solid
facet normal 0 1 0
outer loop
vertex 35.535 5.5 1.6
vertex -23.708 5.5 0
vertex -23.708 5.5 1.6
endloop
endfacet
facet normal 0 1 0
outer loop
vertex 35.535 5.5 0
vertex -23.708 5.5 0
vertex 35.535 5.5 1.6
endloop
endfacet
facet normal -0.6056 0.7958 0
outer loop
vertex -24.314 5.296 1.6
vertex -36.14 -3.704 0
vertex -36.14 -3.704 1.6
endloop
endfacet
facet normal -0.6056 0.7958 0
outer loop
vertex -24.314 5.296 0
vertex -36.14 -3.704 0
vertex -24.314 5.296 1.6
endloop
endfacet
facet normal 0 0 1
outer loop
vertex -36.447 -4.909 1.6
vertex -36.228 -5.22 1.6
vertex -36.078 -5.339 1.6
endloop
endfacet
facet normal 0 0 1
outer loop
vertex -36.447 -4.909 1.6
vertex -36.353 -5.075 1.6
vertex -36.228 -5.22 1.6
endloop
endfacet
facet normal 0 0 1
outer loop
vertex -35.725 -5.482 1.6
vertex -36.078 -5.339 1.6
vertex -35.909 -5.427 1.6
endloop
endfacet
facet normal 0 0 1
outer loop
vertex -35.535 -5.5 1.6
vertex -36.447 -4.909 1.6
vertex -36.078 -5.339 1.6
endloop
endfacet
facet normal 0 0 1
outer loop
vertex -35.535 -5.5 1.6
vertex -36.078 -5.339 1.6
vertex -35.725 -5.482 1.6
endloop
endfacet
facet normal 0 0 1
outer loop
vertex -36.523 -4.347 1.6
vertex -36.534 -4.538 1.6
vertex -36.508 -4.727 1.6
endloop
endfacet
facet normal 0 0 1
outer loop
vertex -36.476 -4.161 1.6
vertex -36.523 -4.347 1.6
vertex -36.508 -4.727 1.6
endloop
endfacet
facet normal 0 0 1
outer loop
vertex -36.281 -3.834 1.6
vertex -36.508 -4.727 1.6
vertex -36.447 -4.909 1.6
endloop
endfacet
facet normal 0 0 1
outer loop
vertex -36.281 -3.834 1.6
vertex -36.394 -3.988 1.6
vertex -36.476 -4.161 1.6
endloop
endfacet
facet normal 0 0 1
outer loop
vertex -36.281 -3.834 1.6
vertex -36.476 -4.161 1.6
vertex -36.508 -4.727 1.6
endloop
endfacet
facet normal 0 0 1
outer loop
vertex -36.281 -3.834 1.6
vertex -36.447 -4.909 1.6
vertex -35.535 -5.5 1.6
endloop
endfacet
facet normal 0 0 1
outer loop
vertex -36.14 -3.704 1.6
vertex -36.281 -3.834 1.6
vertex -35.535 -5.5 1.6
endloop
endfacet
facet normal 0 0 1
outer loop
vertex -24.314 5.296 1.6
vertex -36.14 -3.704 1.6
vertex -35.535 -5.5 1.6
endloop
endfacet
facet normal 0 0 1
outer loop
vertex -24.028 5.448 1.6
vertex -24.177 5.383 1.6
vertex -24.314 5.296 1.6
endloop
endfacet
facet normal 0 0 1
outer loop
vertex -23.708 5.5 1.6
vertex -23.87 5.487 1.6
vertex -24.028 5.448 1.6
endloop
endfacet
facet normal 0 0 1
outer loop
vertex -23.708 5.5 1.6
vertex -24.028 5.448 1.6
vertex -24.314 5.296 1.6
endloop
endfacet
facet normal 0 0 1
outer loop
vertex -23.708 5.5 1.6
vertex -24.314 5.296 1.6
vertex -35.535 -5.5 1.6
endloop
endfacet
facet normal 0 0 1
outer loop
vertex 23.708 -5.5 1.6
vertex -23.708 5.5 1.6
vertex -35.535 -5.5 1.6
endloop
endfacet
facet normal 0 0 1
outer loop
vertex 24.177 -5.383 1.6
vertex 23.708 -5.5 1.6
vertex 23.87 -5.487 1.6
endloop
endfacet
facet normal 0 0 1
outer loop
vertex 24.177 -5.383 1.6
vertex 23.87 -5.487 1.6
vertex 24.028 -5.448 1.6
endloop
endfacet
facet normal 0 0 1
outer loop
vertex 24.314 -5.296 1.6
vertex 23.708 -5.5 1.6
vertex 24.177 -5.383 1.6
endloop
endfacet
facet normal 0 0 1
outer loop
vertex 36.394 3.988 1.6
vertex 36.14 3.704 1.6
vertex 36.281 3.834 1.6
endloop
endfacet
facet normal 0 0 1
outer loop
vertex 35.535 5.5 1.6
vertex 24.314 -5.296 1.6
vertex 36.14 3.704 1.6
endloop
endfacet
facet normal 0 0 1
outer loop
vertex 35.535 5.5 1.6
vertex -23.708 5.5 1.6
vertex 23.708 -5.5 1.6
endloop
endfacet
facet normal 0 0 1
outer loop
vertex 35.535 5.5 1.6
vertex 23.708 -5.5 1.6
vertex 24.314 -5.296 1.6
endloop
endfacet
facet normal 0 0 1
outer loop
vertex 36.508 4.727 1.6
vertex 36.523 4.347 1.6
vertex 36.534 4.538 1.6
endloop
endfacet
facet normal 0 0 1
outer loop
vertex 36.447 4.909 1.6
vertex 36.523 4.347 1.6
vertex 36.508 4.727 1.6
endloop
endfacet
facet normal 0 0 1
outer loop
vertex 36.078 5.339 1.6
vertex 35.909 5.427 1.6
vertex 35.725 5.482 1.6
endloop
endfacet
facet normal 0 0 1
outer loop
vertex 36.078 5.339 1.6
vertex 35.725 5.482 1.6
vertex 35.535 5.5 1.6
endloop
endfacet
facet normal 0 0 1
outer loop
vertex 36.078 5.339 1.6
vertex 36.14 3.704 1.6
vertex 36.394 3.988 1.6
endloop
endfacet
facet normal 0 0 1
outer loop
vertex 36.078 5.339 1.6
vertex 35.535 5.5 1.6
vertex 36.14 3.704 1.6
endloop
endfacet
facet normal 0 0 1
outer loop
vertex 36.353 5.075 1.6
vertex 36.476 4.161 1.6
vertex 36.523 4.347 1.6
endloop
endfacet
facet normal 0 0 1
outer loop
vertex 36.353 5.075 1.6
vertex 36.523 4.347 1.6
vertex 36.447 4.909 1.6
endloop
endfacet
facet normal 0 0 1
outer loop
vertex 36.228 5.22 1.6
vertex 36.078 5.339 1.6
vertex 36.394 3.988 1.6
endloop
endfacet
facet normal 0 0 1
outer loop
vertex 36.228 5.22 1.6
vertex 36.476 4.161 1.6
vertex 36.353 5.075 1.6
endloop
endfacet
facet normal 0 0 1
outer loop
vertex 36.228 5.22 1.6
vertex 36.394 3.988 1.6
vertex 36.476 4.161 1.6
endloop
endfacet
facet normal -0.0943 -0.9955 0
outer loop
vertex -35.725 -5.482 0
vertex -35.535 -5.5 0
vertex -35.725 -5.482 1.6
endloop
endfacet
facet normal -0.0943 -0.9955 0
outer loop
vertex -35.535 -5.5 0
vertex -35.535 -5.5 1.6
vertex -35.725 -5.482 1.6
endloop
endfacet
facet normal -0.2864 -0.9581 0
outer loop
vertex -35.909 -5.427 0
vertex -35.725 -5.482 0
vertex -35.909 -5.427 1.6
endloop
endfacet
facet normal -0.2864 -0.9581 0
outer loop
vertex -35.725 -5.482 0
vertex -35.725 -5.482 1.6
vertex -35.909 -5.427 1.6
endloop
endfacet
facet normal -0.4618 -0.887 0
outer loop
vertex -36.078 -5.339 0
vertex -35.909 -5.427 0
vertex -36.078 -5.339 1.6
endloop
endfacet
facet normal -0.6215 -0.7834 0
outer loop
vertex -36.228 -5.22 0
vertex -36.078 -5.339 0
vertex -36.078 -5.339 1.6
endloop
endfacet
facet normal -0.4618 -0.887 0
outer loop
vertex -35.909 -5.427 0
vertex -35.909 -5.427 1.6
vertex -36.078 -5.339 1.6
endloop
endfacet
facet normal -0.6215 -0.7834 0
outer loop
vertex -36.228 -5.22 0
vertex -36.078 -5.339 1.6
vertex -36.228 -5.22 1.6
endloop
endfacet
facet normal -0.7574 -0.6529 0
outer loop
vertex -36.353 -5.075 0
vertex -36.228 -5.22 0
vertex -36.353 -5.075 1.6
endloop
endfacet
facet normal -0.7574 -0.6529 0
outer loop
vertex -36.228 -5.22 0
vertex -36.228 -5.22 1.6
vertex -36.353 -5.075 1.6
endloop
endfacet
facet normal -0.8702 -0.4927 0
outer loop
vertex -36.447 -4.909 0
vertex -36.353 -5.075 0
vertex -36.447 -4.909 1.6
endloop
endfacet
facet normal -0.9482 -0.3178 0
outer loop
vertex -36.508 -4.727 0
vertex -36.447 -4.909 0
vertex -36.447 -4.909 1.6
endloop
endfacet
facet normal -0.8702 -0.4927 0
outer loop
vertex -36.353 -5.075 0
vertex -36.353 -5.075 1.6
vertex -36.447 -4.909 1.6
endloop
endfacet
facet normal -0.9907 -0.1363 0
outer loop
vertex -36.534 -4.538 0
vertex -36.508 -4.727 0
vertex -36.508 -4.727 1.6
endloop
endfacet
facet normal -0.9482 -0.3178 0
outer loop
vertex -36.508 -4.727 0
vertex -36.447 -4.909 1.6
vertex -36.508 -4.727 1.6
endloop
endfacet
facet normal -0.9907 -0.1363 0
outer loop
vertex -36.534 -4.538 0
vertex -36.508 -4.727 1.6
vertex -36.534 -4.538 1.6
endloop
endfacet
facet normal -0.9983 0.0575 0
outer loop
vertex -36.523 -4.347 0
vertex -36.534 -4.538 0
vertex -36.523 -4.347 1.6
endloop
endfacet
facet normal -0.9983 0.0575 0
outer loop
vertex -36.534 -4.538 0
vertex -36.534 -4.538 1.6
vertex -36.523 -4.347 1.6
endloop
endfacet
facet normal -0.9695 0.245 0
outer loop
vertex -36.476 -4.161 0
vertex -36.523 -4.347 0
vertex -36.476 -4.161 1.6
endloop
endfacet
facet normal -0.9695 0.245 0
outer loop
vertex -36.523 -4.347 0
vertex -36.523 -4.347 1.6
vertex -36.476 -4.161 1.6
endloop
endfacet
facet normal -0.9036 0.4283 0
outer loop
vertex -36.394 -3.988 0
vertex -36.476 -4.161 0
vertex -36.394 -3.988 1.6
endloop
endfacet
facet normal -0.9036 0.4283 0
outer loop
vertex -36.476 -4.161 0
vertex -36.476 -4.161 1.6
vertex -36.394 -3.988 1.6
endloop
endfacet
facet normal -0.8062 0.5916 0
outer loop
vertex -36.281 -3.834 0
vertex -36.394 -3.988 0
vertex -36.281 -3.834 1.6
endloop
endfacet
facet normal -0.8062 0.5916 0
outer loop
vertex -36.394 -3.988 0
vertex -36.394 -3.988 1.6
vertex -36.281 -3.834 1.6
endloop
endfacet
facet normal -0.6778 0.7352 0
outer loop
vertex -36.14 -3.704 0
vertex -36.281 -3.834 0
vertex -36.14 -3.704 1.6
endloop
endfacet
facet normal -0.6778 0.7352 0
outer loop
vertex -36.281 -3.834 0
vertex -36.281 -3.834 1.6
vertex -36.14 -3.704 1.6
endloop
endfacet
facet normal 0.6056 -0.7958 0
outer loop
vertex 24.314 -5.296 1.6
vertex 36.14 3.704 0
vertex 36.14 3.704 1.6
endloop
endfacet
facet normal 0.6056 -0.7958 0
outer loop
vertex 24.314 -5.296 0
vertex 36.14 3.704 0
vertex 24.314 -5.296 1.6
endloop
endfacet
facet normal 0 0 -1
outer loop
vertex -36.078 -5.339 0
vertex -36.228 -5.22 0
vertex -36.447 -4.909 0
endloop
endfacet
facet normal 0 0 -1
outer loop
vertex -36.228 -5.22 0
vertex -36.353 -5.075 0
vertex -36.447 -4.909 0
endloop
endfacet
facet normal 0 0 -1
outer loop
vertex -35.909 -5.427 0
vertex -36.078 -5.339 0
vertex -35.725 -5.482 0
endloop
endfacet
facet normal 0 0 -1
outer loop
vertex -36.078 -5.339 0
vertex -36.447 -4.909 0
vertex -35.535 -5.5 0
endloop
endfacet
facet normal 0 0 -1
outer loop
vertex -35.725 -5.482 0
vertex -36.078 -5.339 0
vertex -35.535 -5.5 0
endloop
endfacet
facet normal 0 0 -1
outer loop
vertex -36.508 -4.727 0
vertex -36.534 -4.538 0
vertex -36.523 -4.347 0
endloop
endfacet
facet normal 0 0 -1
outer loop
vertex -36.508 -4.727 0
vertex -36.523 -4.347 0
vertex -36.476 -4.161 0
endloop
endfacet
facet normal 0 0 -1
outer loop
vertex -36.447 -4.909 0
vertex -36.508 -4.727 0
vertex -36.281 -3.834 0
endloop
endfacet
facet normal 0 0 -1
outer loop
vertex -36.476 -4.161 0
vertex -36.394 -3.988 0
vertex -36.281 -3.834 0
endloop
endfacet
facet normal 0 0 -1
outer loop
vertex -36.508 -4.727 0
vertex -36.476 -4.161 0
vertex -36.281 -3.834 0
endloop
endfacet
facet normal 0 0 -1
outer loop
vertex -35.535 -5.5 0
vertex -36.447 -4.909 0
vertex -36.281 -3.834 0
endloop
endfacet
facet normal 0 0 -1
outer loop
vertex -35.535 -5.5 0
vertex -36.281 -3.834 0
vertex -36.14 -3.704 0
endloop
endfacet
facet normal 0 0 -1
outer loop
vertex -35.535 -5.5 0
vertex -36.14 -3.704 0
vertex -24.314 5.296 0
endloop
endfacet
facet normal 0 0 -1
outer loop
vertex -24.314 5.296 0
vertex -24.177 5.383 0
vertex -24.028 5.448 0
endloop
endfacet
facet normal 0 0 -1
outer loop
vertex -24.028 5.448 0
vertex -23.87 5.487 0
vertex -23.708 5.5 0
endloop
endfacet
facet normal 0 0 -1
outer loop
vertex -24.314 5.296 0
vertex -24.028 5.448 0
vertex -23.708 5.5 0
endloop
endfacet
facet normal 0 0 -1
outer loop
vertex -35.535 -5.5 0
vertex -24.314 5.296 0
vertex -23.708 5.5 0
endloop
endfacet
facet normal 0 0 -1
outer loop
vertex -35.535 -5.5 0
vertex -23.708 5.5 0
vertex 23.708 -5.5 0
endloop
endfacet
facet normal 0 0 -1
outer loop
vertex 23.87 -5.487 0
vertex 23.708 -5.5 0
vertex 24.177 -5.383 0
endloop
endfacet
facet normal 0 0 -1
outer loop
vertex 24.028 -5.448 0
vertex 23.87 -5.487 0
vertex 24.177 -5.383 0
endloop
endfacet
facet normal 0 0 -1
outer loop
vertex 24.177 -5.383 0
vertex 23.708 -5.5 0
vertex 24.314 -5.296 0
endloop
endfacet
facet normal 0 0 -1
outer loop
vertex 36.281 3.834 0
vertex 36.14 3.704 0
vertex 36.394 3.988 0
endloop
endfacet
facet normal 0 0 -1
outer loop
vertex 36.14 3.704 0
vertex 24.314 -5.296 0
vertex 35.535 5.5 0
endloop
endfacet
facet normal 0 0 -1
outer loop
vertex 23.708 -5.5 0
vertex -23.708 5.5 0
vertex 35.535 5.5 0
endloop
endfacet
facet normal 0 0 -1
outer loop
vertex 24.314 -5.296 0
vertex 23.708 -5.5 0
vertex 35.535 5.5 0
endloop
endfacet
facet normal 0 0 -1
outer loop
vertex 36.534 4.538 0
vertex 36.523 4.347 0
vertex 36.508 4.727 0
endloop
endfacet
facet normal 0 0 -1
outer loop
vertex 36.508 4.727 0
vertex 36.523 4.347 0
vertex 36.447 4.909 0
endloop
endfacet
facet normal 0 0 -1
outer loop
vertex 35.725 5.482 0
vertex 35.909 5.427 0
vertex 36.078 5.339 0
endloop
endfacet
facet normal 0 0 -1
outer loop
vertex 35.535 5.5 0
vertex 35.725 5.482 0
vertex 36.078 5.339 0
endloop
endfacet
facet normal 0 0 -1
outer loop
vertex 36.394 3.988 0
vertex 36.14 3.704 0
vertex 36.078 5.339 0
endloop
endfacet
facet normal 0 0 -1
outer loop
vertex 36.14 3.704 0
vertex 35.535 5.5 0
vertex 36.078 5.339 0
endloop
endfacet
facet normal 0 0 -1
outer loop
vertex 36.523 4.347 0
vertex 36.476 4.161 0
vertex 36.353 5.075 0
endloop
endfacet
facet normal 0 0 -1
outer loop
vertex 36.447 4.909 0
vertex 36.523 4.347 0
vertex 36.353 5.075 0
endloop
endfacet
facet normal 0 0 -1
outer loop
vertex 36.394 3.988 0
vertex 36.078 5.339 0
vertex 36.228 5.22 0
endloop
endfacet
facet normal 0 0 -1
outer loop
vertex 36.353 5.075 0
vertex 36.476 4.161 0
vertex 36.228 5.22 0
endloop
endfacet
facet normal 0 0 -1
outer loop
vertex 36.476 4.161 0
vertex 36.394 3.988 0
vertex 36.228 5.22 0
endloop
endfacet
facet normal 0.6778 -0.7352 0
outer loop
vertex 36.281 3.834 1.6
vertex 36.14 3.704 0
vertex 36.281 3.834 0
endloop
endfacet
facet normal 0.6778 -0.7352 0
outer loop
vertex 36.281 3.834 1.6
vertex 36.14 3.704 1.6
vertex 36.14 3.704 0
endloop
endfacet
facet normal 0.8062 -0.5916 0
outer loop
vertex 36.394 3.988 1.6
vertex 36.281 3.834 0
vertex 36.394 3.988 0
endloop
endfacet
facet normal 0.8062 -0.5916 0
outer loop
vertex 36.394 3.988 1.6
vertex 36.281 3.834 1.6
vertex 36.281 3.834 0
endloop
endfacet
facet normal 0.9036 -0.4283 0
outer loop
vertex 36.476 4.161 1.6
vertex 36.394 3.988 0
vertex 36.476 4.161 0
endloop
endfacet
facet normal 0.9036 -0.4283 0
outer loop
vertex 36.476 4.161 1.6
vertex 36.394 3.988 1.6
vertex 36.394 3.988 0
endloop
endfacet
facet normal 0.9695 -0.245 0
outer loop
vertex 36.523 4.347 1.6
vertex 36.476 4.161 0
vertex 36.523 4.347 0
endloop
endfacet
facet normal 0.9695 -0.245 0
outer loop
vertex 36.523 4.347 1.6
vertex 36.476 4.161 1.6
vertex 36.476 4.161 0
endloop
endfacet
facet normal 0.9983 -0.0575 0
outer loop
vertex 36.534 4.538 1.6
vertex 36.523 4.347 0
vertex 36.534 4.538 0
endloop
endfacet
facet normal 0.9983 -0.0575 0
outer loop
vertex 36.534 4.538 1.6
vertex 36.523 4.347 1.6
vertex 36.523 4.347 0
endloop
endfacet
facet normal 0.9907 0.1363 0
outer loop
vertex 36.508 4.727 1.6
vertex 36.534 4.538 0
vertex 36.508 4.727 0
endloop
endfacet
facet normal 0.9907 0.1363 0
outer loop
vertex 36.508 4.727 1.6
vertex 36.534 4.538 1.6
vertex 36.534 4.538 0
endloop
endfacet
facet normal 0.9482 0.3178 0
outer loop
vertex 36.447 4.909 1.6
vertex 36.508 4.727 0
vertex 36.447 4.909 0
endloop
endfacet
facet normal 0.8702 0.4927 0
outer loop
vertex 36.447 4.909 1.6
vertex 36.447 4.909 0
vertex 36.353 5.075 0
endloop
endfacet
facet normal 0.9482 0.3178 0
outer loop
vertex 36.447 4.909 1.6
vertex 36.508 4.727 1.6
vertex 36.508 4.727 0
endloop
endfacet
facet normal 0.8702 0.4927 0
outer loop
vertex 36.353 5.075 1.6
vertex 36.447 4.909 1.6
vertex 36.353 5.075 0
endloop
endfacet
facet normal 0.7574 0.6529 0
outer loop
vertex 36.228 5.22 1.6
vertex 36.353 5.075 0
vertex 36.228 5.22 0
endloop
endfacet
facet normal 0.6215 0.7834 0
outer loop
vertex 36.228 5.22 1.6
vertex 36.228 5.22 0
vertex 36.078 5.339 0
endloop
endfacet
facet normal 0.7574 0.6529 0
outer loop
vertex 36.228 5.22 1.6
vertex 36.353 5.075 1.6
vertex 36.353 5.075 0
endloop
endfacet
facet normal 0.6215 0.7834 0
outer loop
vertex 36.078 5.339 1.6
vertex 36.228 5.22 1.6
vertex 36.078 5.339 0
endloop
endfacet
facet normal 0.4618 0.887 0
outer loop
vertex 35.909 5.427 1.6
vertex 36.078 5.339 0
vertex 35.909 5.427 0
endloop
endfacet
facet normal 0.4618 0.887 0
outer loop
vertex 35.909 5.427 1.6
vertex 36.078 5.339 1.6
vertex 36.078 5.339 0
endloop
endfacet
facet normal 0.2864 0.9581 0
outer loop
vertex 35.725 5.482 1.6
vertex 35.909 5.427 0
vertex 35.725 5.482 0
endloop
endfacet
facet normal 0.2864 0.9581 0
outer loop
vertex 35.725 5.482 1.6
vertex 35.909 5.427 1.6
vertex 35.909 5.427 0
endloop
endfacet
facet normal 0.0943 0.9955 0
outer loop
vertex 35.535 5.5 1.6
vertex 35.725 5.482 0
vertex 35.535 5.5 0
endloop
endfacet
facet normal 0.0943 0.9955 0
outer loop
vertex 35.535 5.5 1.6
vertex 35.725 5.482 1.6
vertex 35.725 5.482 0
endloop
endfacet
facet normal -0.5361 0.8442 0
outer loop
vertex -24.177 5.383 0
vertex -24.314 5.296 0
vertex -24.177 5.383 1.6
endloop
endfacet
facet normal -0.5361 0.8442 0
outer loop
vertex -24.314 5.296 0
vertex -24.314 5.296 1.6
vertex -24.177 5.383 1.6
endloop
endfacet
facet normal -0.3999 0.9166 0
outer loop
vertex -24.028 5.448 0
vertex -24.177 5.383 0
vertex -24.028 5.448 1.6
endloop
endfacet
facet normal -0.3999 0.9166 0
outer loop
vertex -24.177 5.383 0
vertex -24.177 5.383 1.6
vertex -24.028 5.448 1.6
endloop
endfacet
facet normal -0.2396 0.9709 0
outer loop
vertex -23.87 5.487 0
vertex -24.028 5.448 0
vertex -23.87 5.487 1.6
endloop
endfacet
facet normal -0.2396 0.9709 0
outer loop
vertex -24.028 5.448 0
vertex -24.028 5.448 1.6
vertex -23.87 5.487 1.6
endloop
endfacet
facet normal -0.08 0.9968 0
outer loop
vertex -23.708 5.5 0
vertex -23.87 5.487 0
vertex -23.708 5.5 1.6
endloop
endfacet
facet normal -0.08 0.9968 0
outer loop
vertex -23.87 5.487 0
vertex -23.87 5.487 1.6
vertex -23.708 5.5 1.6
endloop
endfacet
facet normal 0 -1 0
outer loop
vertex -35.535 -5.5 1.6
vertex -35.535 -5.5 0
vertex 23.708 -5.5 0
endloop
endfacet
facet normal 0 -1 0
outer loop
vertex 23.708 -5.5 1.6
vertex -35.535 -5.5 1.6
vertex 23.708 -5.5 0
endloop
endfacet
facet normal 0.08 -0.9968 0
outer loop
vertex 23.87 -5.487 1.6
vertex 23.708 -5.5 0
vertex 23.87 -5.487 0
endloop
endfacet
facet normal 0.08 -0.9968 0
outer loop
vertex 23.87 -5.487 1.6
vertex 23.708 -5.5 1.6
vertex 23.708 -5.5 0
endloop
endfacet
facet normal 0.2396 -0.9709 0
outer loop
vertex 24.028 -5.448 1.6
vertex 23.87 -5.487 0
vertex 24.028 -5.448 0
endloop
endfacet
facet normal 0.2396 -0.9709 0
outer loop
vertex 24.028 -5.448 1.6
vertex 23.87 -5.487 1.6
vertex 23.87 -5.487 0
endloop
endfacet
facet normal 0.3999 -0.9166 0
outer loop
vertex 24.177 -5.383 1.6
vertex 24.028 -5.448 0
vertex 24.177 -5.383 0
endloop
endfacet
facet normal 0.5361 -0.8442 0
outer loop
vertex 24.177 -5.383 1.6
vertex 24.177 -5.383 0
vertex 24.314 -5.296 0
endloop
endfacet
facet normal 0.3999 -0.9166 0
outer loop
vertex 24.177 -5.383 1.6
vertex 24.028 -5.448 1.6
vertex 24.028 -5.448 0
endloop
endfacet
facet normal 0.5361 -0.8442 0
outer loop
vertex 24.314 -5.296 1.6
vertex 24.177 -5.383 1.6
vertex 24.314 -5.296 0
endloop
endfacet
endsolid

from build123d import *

# Parameters (mm, degrees)
SKETCH1_W               = 77
SKETCH1_H               = 11
BOSS_EXTRUDE1_DEPTH     = 1.6
CUT_EXTRUDE1_DEPTH      = 39.923771657
CUT_EXTRUDE1_DEPTH_BACK = 10
FILLET2_R               = 1


with BuildPart() as part:
    # Sketch1 → Boss-Extrude1 (new body)
    with BuildSketch(Plane.XY):
        Rectangle(SKETCH1_W, SKETCH1_H)
    extrude(amount=BOSS_EXTRUDE1_DEPTH)

    # Sketch2 → Cut-Extrude1 (cut, two sides: drawn at the far end of the back side and taken through both)
    with BuildSketch(Plane.XY.offset(1.6).offset(-CUT_EXTRUDE1_DEPTH_BACK)):
        Polygon((38.5, -5.5), (38.5, 5.5), (24.04554885, -5.5), align=None)
        Polygon((-38.5, -5.5), (-24.04554885, 5.5), (-38.5, 5.5), align=None)
    extrude(amount=CUT_EXTRUDE1_DEPTH + CUT_EXTRUDE1_DEPTH_BACK, mode=Mode.SUBTRACT)

    # Fillet2
    fillet2_edges = [part.edges().sort_by_distance(p)[0] for p in [
        (24.04554885, -5.5, 0.8),
        (-24.04554885, 5.5, 0.8),
        (-38.5, -5.5, 0.8),
        (38.5, 5.5, 0.8),
    ]]
    fillet(fillet2_edges, radius=FILLET2_R)


solid = part.part
